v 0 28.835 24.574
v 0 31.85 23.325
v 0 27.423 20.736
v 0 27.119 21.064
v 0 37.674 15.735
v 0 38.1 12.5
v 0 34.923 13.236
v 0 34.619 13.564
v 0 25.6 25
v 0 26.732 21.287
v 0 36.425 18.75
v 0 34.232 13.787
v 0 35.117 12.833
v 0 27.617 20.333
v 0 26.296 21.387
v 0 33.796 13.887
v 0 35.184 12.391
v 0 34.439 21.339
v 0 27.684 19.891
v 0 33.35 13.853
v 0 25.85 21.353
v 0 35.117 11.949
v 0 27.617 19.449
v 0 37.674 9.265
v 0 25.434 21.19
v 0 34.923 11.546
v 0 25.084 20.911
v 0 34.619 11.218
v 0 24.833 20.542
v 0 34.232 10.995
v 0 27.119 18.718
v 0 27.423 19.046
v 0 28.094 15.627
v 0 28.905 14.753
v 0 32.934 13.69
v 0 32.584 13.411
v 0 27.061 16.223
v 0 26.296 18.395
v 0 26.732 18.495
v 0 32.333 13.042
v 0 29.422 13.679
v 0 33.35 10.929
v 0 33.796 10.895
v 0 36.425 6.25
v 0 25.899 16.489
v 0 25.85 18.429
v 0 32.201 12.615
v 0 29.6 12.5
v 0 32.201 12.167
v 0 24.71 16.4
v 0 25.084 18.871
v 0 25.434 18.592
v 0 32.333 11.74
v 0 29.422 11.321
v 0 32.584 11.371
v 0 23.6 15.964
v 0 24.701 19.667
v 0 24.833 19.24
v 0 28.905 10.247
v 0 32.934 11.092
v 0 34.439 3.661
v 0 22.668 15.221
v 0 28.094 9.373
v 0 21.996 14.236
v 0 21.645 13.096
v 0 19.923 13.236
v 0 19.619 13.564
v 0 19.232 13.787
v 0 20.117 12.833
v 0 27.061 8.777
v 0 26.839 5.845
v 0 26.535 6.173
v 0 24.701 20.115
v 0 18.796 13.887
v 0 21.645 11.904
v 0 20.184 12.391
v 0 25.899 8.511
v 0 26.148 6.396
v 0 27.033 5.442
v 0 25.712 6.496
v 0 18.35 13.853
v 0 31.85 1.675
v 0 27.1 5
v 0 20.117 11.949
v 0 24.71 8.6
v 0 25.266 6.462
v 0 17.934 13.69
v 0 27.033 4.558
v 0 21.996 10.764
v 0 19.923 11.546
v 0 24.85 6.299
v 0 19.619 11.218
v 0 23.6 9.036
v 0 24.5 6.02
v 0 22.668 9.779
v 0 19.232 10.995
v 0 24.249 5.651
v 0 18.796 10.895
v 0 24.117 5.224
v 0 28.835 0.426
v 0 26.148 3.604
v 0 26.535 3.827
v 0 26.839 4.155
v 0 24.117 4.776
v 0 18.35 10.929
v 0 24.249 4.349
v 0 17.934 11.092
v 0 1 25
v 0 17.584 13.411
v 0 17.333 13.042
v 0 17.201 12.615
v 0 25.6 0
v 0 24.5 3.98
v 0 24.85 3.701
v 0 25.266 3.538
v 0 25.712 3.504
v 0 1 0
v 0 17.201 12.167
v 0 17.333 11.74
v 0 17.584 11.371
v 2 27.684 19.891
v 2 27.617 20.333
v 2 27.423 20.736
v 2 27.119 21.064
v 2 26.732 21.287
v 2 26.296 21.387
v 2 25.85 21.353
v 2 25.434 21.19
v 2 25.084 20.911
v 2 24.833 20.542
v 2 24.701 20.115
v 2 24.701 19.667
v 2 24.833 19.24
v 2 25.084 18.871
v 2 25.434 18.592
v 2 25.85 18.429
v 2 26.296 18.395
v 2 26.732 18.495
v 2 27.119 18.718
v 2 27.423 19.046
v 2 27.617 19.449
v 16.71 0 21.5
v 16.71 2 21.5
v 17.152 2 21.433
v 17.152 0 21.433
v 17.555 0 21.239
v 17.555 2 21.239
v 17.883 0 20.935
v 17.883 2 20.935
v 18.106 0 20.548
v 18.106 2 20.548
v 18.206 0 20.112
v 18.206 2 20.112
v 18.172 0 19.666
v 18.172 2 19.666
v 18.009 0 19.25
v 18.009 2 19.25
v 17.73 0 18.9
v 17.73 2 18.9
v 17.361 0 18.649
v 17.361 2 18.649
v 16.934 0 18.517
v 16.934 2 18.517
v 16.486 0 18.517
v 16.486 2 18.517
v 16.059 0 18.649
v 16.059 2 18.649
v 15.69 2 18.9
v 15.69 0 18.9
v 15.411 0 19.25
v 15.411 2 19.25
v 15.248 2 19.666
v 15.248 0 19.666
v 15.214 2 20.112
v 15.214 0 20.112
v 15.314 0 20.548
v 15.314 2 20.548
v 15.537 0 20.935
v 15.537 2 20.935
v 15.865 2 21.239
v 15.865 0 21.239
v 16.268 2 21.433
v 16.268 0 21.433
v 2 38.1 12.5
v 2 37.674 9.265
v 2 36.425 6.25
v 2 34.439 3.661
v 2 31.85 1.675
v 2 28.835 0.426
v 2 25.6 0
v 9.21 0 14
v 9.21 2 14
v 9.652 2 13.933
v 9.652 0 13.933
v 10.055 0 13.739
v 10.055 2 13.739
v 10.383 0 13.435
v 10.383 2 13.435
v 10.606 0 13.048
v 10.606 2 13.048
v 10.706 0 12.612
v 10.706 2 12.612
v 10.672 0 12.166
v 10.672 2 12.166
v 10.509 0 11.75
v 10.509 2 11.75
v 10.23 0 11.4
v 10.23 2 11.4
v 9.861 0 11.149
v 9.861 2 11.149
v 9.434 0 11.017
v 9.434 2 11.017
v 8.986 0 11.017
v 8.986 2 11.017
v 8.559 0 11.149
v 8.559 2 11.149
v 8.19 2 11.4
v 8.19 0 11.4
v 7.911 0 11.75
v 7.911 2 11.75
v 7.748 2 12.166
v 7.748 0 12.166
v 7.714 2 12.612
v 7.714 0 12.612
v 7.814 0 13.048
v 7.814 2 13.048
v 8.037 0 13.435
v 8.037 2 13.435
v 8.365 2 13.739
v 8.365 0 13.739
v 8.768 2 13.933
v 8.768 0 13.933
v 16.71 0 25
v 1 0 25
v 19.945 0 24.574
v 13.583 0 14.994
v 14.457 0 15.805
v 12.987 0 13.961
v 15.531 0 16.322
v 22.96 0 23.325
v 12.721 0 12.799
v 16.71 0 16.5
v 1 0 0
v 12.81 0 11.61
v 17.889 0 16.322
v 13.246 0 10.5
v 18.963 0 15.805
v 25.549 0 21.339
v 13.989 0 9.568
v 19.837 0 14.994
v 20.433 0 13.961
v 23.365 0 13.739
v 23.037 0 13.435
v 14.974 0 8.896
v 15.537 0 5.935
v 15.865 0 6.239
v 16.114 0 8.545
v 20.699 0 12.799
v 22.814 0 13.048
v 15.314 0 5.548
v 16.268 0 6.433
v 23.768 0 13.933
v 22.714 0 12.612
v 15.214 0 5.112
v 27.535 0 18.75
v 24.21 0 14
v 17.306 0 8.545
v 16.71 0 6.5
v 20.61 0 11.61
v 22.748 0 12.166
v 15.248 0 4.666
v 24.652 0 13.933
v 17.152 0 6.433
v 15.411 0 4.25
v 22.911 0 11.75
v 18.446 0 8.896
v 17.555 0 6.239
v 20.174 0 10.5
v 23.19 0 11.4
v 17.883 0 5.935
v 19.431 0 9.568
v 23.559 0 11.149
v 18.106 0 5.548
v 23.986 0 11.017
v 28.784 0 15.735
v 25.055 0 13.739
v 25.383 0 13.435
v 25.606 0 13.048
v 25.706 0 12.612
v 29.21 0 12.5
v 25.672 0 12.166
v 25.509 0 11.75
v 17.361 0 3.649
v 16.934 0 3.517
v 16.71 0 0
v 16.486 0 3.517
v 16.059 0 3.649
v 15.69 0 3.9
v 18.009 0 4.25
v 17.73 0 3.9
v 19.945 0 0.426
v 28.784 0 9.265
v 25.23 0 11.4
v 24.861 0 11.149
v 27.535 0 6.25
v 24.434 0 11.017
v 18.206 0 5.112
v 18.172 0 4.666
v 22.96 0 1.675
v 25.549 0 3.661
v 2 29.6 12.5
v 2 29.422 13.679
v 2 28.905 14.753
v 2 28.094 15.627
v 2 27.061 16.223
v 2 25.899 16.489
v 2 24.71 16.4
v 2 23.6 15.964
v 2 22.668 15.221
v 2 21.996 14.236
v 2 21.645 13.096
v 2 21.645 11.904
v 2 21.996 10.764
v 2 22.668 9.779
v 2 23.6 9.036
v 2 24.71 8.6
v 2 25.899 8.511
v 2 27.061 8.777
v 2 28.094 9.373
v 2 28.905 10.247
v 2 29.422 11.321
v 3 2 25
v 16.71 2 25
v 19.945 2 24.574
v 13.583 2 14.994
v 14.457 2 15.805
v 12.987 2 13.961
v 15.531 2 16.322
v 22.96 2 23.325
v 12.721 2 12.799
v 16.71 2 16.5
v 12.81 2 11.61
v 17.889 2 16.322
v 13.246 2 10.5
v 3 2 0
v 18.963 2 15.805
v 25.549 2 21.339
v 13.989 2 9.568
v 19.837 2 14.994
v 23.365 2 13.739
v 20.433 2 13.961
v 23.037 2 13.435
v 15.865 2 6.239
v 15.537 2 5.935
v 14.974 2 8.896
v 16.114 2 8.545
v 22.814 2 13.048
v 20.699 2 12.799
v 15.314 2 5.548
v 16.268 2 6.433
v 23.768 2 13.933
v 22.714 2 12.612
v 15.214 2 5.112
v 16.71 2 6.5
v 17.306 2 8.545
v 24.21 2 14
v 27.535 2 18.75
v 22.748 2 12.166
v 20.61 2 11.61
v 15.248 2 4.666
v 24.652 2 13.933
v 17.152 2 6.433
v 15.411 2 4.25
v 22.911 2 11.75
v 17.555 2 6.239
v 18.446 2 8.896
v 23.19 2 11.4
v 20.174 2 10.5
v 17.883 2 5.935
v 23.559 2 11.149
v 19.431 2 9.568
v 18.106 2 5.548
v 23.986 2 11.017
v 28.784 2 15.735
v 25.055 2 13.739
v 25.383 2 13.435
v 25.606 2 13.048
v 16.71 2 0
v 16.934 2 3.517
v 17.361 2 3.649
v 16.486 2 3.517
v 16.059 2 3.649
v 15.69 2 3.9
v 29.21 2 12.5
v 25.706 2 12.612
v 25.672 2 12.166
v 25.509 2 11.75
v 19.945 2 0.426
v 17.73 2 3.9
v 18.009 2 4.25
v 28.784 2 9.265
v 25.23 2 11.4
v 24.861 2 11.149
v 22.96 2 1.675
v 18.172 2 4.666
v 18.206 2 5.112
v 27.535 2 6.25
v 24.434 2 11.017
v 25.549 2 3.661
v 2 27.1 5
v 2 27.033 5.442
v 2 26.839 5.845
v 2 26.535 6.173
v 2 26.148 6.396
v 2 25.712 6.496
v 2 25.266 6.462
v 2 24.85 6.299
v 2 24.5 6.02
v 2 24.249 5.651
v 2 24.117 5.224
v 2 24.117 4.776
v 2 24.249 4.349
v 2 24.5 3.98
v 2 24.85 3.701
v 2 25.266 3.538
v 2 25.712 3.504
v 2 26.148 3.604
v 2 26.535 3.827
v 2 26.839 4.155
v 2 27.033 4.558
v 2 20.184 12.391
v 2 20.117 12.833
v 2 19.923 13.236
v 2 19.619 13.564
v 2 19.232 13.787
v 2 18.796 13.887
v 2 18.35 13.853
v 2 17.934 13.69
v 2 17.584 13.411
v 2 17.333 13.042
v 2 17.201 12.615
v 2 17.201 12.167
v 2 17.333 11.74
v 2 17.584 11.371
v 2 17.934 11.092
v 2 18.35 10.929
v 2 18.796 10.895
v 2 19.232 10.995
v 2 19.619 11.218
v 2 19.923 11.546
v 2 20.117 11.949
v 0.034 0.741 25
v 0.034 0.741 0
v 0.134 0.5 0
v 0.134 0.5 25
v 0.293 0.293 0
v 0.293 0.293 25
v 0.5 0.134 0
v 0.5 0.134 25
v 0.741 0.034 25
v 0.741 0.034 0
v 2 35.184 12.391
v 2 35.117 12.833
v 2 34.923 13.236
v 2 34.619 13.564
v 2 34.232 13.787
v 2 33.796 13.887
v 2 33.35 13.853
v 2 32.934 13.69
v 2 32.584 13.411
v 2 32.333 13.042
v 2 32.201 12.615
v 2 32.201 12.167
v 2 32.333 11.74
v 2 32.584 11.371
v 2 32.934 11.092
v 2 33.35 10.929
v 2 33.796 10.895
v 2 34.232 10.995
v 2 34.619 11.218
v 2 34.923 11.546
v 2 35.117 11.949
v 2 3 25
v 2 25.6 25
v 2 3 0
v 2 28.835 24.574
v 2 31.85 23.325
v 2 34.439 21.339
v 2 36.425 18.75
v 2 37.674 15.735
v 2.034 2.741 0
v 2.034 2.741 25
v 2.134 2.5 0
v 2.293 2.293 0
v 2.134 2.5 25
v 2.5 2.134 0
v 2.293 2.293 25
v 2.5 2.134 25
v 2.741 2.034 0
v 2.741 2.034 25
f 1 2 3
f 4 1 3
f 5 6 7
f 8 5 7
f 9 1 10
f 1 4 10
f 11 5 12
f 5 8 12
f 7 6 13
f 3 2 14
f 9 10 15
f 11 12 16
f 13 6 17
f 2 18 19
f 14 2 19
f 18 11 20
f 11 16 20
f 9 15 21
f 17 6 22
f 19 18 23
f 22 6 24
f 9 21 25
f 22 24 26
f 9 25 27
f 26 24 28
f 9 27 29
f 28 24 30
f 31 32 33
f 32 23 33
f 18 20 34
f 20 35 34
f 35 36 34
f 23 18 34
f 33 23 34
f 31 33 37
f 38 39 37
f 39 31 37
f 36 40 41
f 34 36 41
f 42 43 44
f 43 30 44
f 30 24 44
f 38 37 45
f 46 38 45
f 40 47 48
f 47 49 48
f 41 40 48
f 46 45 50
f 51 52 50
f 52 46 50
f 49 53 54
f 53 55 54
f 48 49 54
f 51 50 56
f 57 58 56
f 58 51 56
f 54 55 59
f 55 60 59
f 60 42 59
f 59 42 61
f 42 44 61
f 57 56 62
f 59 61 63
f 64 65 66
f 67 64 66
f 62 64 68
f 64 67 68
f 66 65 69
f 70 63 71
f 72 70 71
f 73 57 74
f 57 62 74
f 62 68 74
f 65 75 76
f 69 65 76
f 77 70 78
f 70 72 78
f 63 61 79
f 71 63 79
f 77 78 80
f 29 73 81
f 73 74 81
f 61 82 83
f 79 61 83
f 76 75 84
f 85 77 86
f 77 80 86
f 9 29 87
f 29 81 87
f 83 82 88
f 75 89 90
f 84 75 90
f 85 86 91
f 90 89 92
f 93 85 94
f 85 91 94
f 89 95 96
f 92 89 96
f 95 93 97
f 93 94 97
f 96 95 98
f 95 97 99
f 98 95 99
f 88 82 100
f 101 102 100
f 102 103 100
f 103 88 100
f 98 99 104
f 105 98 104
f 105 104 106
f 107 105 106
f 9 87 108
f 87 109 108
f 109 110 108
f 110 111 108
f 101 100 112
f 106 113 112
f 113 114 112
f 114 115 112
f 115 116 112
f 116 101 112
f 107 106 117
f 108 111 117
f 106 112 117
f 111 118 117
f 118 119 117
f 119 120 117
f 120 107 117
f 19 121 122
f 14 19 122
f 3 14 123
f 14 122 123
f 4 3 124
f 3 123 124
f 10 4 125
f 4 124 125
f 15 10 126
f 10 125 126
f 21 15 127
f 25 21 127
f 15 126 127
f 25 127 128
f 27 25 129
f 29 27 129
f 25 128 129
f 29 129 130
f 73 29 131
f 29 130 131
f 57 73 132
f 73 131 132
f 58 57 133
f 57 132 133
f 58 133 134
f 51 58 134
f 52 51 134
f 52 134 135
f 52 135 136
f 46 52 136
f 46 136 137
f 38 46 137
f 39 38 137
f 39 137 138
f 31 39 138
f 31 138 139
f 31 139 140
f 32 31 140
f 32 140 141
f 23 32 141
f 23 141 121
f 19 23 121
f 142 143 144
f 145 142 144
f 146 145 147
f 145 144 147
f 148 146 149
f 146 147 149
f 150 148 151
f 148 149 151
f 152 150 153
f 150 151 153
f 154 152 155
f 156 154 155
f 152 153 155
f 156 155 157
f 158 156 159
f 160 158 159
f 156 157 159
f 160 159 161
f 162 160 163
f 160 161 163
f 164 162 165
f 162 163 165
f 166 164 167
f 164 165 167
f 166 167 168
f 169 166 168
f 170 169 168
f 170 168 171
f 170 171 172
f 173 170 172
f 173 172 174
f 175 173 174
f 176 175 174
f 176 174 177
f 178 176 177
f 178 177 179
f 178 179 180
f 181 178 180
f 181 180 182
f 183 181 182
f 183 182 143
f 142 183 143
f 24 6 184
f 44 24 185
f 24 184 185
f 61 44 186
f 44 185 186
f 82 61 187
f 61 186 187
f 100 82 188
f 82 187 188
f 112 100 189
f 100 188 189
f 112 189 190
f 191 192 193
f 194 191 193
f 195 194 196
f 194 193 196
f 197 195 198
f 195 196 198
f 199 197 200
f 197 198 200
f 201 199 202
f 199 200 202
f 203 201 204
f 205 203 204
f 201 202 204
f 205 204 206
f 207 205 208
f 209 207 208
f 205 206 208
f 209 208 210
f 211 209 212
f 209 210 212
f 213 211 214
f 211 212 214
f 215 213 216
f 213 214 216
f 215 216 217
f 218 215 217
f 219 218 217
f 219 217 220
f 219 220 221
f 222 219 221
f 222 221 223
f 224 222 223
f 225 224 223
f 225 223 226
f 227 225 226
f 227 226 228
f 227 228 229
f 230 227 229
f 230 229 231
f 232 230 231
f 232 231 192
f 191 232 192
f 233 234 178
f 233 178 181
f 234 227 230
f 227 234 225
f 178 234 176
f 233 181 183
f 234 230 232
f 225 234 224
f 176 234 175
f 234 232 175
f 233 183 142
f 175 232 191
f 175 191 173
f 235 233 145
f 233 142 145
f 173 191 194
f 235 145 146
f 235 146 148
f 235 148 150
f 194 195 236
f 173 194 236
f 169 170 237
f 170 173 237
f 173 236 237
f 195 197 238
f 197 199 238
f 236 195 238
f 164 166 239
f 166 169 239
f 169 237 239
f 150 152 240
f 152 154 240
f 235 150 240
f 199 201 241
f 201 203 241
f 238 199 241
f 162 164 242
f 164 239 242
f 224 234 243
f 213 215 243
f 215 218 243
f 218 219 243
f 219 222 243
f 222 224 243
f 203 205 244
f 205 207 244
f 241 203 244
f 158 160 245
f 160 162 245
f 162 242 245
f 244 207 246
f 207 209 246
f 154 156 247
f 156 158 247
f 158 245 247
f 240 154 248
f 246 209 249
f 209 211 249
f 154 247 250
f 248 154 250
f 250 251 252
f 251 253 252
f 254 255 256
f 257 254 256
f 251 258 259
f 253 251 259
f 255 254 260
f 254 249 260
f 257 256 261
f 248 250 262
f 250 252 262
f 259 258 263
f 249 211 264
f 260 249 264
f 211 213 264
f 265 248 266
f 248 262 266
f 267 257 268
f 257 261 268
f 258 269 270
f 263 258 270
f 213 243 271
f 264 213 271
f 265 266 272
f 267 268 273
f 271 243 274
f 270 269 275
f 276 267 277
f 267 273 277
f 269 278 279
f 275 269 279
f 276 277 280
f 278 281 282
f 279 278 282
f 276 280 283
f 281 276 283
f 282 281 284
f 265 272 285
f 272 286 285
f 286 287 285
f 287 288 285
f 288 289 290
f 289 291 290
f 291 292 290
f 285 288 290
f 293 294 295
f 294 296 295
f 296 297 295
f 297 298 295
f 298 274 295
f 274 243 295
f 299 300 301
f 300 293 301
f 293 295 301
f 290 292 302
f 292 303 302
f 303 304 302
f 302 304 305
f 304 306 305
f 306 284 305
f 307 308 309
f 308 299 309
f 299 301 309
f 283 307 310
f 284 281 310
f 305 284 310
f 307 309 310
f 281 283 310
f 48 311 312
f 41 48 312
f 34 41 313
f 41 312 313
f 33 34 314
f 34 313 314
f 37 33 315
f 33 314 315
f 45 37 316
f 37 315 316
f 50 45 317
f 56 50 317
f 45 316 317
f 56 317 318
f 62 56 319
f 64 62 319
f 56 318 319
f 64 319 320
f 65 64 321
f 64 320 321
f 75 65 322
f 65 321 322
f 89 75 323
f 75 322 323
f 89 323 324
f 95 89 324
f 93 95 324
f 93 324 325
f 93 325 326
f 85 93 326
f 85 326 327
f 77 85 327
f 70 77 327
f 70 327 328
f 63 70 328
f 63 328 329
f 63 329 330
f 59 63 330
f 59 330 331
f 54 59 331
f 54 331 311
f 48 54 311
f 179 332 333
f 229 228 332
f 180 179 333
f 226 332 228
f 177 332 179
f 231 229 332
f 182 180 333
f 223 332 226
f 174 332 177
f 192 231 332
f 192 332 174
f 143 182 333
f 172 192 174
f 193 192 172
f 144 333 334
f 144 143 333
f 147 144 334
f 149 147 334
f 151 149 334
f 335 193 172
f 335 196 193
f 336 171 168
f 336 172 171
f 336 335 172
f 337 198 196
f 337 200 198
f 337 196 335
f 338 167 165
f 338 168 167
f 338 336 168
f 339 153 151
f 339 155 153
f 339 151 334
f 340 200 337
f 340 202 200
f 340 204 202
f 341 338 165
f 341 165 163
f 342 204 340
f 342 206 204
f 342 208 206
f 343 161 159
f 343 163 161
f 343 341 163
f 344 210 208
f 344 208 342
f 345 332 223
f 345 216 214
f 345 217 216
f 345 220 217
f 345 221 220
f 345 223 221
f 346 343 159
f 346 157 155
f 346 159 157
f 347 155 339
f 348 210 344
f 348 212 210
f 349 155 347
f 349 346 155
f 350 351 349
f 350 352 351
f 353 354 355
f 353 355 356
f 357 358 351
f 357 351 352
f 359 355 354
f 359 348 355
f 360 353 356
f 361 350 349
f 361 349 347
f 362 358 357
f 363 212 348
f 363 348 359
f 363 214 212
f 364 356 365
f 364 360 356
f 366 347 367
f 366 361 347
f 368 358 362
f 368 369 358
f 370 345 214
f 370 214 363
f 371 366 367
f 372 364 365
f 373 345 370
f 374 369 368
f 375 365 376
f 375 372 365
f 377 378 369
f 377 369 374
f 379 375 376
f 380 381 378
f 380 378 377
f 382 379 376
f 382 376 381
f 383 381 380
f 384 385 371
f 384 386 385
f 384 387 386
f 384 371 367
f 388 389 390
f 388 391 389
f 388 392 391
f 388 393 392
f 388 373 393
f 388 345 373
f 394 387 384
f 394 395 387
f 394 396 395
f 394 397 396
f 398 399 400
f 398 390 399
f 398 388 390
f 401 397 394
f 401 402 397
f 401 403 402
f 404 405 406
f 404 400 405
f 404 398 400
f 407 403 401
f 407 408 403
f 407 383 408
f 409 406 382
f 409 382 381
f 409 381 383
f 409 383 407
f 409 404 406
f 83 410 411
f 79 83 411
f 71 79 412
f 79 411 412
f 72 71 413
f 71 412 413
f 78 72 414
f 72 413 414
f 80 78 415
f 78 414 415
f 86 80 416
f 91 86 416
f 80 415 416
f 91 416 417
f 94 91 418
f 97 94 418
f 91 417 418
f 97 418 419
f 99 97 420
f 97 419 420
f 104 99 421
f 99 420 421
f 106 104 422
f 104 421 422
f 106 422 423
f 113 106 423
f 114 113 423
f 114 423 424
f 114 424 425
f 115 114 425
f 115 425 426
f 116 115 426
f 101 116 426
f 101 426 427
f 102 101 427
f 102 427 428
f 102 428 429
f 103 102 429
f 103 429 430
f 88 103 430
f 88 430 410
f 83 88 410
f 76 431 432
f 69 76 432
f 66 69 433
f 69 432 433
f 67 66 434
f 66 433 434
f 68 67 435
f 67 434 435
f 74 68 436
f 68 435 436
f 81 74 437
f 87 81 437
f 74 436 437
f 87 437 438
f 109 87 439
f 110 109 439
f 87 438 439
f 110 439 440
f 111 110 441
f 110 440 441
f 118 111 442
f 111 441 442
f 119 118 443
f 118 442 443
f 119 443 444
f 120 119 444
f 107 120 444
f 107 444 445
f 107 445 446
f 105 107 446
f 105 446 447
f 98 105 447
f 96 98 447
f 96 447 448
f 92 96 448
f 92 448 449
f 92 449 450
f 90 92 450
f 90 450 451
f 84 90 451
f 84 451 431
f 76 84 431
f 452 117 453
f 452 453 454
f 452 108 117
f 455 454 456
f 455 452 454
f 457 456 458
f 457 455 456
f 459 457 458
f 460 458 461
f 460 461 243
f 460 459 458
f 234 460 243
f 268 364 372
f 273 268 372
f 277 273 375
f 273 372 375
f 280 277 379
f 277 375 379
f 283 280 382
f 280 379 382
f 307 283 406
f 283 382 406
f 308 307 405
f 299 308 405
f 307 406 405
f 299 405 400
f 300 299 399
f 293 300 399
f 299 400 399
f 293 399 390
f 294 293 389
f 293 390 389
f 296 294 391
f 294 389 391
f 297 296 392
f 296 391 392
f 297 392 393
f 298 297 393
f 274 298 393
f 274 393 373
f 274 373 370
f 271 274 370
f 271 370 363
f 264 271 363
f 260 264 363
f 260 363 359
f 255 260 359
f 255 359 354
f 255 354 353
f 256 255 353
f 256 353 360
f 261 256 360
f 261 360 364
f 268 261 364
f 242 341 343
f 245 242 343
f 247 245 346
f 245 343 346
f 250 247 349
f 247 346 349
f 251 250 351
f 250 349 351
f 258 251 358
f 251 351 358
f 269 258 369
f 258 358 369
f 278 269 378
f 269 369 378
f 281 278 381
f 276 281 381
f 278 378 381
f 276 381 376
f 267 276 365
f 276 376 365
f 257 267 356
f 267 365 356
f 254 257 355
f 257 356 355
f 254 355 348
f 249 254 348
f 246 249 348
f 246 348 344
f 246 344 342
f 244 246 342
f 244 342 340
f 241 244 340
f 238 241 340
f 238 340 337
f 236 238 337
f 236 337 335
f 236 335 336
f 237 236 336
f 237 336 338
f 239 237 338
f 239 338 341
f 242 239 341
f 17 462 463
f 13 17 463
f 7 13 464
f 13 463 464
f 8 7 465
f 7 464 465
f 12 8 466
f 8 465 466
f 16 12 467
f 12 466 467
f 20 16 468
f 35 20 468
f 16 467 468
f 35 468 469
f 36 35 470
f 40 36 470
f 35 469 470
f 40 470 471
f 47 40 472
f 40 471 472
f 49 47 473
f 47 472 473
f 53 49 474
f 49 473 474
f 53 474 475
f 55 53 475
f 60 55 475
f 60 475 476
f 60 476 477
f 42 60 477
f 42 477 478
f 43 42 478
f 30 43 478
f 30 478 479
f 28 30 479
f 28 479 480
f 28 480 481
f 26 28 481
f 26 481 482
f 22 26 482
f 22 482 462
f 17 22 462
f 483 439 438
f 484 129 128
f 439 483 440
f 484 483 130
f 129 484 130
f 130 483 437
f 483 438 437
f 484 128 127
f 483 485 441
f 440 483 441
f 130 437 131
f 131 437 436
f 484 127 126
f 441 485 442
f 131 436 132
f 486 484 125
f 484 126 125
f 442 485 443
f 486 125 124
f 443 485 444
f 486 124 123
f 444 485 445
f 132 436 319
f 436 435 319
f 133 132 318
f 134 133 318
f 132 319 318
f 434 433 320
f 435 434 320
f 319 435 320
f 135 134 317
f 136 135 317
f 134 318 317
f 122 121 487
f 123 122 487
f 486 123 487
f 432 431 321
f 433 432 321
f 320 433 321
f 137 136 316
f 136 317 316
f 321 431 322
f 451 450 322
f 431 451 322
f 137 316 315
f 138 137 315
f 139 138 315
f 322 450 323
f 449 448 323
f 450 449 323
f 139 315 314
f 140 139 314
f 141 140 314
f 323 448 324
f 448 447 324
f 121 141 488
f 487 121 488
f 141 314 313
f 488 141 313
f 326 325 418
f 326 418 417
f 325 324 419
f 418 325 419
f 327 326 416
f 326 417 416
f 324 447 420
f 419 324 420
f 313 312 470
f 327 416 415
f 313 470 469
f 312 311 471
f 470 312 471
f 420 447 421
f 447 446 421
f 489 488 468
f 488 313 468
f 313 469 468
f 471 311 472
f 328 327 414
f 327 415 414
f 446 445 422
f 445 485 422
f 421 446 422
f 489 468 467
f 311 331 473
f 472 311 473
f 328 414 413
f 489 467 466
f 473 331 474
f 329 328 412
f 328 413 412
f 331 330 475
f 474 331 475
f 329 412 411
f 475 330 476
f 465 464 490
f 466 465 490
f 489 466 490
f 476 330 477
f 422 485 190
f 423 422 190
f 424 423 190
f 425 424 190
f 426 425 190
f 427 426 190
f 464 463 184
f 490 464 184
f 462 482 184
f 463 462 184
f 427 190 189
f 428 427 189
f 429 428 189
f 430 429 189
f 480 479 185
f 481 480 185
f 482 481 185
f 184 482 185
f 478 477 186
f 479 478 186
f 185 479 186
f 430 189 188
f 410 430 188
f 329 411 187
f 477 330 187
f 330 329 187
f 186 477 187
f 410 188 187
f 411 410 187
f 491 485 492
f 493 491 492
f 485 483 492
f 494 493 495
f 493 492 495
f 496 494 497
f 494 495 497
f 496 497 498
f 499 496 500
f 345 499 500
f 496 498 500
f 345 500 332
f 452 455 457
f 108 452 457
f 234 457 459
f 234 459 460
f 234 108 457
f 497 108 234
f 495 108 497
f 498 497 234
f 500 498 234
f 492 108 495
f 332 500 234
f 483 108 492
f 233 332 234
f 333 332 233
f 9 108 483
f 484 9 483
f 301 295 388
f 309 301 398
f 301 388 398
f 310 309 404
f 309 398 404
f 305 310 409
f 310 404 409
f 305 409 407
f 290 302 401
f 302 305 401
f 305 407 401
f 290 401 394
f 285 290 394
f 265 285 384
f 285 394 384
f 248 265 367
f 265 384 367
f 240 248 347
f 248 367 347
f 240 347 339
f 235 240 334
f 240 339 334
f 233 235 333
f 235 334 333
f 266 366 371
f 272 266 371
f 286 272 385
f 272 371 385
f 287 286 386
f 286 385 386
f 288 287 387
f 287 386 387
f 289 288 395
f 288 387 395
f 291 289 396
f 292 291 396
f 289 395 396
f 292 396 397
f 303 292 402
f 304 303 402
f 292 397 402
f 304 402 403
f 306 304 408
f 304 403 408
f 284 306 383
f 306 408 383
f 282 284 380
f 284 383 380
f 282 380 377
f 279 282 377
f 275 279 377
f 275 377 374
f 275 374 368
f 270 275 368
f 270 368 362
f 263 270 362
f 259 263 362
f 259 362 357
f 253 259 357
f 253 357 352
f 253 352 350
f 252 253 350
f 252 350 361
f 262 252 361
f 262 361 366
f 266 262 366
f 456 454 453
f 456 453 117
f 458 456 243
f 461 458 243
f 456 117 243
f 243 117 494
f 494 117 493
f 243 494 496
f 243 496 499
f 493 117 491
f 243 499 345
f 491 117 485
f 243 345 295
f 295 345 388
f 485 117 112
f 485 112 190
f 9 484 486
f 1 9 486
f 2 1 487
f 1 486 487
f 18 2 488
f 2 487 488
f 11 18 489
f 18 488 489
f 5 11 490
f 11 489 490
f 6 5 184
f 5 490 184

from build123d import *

# Parameters (mm, degrees)
SKETCH1_W           = 27.21
SKETCH1_H           = 2
BOSS_EXTRUDE1_DEPTH = 25
SKETCH2_R           = 1.5
SKETCH2_R_2         = 4
CUT_EXTRUDE1_DEPTH  = 25
SKETCH3_R           = 1.5
SKETCH3_R_2         = 4
CUT_EXTRUDE3_DEPTH  = 25
FILLET1_R           = 1


with BuildPart() as part:
    # Sketch1 → Boss-Extrude1 (new body)
    with BuildSketch(Plane.XY):
        Polygon((2, 2), (2, 38.1), (0, 38.1), (0, 0), (2, 0), align=None)
        with Locations((15.605, 1)):
            Rectangle(SKETCH1_W, SKETCH1_H)
    extrude(amount=BOSS_EXTRUDE1_DEPTH)

    # Sketch2 → Cut-Extrude1 (cut)
    with BuildSketch(Plane(origin=(0, 2, 0), x_dir=(1, 0, 0), z_dir=(0, 1, 0))):
        with Locations(Location((16.71, -20, 0), (0, 0, 270))):
            Circle(SKETCH2_R)
        with Locations(Location((9.21, -12.5, 0), (0, 0, 270))):
            Circle(SKETCH2_R)
        with Locations(Location((16.71, -5, 0), (0, 0, 270))):
            Circle(SKETCH2_R)
        with Locations(Location((24.21, -12.5, 0), (0, 0, 270))):
            Circle(SKETCH2_R)
        with Locations(Location((16.71, -12.5, 0), (0, 0, 270))):
            Circle(SKETCH2_R_2)
        with BuildLine():
            Line((29.21, -12.5), (29.21, 0))
            Line((29.21, 0), (16.71, 0))
            ThreePointArc((16.71, 0), (25.548834765, -3.661165235), (29.21, -12.5))
        make_face()
        with BuildLine():
            Line((29.21, -25), (29.21, -12.5))
            ThreePointArc((29.21, -12.5), (25.548834765, -21.338834765), (16.71, -25))
            Line((16.71, -25), (29.21, -25))
        make_face()
    extrude(amount=-CUT_EXTRUDE1_DEPTH, mode=Mode.SUBTRACT)

    # Sketch3 → Cut-Extrude3 (cut)
    with BuildSketch(Plane(origin=(2, 0, 0), x_dir=(0, 0, -1), z_dir=(1, 0, 0))):
        with BuildLine():
            ThreePointArc((-25, 25.599999976), (-21.338834773, 34.438834756), (-12.5, 38.1))
            Line((-12.5, 38.1), (-25, 38.1))
            Line((-25, 38.1), (-25, 25.599999976))
        make_face()
        with BuildLine():
            Line((0, 25.6), (0, 38.1))
            Line((0, 38.1), (-12.5, 38.1))
            ThreePointArc((-12.5, 38.1), (-3.661165235, 34.438834765), (0, 25.6))
        make_face()
        with Locations(Location((-12.390951319, 33.683987084, 0), (0, 0, 90))):
            Circle(SKETCH3_R)
        with Locations(Location((-5, 25.6, 0), (0, 0, 90))):
            Circle(SKETCH3_R)
        with Locations(Location((-19.890951319, 26.183987084, 0), (0, 0, 90))):
            Circle(SKETCH3_R)
        with Locations(Location((-12.5, 25.6, 0), (0, 0, 90))):
            Circle(SKETCH3_R_2)
        with Locations(Location((-12.390951319, 18.683987084, 0), (0, 0, 90))):
            Circle(SKETCH3_R)
    extrude(amount=-CUT_EXTRUDE3_DEPTH, mode=Mode.SUBTRACT)

    # Fillet1
    fillet1_edges = [part.edges().sort_by_distance(p)[0] for p in [
        (2, 2, 12.5),
        (0, 0, 12.5),
    ]]
    fillet(fillet1_edges, radius=FILLET1_R)


solid = part.part
